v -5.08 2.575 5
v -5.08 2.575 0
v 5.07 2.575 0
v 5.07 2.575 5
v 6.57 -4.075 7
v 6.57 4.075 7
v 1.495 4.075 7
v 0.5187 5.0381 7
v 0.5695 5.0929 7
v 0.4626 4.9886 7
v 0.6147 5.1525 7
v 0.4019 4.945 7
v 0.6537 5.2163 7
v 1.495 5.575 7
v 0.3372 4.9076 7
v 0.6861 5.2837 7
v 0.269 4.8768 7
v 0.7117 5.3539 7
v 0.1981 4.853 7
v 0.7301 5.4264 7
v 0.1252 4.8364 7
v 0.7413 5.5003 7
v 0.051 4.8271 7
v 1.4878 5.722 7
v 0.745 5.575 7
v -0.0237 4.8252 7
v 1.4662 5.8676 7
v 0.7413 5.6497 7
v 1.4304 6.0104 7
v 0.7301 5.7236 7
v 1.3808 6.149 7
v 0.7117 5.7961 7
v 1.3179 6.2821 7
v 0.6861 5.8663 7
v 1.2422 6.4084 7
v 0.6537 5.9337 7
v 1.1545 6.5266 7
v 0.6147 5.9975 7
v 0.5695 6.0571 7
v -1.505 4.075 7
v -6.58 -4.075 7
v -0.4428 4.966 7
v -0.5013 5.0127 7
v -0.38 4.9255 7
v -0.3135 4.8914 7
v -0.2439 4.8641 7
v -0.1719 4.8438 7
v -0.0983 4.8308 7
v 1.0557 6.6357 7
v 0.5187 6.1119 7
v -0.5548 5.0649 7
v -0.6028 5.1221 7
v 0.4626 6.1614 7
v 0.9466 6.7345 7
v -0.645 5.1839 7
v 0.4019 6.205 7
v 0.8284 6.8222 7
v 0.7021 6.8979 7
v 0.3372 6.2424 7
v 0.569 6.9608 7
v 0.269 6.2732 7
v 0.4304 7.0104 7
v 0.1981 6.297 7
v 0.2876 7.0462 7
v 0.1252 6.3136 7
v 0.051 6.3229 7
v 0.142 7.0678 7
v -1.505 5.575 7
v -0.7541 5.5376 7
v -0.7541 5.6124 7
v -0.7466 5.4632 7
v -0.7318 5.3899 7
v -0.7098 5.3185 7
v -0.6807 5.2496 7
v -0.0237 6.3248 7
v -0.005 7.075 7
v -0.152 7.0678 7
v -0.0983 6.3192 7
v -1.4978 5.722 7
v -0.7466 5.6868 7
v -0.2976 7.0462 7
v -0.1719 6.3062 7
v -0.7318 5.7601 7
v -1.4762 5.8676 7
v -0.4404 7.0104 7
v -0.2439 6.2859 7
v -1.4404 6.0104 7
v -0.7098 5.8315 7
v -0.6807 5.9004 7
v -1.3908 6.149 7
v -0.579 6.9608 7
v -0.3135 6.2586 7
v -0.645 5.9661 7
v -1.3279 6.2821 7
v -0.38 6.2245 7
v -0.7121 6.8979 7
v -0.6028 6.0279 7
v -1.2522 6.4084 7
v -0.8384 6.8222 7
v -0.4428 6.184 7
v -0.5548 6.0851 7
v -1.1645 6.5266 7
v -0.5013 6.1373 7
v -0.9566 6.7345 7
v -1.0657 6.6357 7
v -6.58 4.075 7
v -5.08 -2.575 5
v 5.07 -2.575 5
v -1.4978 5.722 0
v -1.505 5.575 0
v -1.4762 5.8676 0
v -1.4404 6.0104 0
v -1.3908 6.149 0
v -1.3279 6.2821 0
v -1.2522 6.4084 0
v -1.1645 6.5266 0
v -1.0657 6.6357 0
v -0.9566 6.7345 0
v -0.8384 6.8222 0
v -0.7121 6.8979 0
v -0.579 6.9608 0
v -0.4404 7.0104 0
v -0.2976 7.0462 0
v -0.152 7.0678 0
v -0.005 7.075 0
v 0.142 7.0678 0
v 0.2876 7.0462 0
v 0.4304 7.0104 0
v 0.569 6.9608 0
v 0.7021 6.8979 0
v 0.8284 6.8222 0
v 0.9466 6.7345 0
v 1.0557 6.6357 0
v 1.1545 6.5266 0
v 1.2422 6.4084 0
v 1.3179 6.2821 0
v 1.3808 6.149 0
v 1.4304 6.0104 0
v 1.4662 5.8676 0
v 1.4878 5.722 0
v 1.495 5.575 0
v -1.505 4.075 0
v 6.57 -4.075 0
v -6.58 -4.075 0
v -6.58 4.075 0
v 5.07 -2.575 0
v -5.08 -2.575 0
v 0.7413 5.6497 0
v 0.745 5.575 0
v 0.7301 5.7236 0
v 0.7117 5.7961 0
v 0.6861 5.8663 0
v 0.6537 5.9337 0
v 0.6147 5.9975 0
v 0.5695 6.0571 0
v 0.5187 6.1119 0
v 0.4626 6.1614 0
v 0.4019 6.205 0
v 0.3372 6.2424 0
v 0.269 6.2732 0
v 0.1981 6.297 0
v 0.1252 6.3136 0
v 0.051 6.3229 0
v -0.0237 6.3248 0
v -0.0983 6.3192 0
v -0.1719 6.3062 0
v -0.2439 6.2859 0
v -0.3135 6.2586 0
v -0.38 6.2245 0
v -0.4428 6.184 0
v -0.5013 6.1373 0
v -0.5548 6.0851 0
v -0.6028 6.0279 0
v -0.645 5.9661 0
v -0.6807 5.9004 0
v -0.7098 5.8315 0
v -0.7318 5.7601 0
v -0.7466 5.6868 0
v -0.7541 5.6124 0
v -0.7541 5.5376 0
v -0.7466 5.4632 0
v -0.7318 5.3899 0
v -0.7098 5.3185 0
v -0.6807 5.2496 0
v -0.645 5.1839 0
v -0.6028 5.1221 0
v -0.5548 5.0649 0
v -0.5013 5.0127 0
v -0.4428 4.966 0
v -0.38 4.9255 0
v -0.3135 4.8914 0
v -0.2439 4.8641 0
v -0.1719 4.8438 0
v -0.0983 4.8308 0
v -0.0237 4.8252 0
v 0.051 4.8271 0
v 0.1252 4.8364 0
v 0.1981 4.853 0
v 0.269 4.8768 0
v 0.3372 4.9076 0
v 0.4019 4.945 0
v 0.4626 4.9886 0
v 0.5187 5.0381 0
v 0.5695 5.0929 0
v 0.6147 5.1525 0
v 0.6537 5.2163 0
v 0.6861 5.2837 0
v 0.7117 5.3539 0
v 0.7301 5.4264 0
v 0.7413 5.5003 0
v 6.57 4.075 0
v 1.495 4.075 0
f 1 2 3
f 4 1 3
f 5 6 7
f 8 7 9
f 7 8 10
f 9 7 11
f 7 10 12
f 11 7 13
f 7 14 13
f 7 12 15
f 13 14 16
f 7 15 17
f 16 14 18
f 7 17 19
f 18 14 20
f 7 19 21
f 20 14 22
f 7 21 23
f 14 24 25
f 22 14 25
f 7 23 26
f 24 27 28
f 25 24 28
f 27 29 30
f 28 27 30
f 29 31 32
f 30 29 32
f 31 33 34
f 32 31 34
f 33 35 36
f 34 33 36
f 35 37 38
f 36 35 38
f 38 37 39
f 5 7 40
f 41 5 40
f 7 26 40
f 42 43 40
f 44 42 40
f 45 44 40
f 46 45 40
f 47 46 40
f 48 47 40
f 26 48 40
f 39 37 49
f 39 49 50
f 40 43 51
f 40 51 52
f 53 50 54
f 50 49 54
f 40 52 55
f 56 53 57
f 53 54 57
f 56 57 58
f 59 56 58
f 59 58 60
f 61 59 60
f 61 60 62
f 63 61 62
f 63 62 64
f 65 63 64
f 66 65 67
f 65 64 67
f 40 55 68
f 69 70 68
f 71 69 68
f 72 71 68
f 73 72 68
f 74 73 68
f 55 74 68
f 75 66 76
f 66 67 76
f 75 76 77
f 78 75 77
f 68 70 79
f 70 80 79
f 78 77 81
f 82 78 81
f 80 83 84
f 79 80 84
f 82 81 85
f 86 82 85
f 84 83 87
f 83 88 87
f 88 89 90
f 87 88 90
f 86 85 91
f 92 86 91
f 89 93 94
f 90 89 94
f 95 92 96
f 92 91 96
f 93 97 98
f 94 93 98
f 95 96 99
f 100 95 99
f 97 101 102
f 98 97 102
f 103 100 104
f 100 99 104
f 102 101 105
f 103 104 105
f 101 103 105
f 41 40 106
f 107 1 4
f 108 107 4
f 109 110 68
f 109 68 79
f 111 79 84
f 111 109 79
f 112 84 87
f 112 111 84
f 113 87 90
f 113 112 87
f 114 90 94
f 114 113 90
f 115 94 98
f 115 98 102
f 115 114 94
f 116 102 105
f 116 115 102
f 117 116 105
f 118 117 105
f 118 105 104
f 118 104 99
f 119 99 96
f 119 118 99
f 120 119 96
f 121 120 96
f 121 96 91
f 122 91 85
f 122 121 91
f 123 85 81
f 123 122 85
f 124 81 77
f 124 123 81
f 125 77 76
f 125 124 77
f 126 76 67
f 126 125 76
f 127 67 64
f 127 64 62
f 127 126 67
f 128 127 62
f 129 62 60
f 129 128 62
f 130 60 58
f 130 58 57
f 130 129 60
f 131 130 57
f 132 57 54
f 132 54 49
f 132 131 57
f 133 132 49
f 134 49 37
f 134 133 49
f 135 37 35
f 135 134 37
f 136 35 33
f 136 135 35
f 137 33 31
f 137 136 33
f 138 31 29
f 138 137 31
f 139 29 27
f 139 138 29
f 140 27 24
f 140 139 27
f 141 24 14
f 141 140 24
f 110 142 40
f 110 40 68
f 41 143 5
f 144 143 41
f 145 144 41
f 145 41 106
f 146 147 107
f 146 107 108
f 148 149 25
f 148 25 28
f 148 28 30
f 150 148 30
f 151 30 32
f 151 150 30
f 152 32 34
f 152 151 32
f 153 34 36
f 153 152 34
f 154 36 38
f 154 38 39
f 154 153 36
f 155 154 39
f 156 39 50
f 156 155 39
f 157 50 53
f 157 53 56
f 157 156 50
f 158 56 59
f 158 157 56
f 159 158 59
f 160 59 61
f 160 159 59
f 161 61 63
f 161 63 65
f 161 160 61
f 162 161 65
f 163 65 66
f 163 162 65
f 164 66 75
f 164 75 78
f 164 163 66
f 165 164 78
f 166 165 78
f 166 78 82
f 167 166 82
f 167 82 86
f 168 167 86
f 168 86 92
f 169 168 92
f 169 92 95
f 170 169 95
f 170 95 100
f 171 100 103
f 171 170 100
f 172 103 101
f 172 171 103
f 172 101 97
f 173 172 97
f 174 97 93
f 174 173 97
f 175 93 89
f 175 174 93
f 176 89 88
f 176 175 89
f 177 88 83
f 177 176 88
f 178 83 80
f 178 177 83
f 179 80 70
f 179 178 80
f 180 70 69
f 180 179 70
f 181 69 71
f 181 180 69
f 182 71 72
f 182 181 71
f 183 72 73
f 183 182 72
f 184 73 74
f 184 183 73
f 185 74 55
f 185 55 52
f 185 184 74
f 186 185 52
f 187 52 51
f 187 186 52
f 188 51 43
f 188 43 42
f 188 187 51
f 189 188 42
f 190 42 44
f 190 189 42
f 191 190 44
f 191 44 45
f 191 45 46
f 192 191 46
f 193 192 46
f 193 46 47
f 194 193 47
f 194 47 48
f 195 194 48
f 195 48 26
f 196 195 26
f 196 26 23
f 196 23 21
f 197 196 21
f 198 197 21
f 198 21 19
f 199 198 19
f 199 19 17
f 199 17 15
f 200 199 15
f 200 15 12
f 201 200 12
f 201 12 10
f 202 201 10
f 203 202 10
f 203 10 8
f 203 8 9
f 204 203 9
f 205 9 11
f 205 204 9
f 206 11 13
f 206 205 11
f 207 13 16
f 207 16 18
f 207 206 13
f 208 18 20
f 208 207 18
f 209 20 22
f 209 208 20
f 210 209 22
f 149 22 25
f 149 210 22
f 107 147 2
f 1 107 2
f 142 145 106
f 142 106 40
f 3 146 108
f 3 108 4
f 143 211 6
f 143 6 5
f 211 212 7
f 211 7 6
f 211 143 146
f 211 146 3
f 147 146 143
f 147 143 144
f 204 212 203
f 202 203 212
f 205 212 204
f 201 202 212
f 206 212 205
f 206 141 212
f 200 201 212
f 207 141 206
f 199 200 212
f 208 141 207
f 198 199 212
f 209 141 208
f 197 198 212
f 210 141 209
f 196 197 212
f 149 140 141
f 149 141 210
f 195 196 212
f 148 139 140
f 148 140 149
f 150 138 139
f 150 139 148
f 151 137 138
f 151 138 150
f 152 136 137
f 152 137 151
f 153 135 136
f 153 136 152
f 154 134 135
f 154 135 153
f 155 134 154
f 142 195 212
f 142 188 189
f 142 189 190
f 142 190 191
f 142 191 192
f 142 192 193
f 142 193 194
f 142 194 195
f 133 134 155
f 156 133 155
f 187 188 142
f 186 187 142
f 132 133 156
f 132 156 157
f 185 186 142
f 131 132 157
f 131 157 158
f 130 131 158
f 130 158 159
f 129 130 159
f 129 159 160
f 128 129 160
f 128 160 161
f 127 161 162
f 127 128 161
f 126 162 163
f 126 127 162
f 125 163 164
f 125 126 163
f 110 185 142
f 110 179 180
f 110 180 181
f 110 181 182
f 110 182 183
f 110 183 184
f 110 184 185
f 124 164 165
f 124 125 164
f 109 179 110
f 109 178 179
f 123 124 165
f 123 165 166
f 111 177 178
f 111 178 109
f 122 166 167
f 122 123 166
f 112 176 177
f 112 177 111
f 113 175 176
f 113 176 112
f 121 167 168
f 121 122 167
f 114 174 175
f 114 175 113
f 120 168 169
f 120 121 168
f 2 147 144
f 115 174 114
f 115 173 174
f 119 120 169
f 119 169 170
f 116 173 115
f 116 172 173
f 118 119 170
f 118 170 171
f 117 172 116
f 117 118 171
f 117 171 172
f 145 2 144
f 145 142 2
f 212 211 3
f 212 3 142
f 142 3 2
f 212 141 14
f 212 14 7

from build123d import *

# Parameters (mm, degrees)
SKETCH1_R           = 0.75
SKETCH1_W           = 10.15
SKETCH1_H           = 5.15
BOSS_EXTRUDE1_DEPTH = 7
SKETCH2_W           = 13.15
SKETCH2_H           = 8.15
BOSS_EXTRUDE2_DEPTH = 2


with BuildPart() as part:
    # Sketch1 → Boss-Extrude1 (new body)
    with BuildSketch(Plane.XY):
        with BuildLine():
            Line((-6.58, 4.075), (-1.505, 4.075))
            Line((-1.505, 4.075), (-1.505, 5.575))
            ThreePointArc((-1.505, 5.575), (-0.005, 7.075), (1.495, 5.575))
            Line((1.495, 5.575), (1.495, 4.075))
            Line((1.495, 4.075), (6.57, 4.075))
            Line((6.57, 4.075), (6.57, -4.075))
            Line((6.57, -4.075), (-6.58, -4.075))
            Line((-6.58, -4.075), (-6.58, 4.075))
        make_face()
        with Locations((-0.005, 5.575)):
            Circle(SKETCH1_R, mode=Mode.SUBTRACT)
        with Locations((-0.005, 0)):
            Rectangle(SKETCH1_W, SKETCH1_H, mode=Mode.SUBTRACT)
    extrude(amount=BOSS_EXTRUDE1_DEPTH)

    # Sketch2 → Boss-Extrude2 (add)
    with BuildSketch(Plane.XY.offset(7)):
        with Locations((-0.005, 0)):
            Rectangle(SKETCH2_W, SKETCH2_H)
    extrude(amount=-BOSS_EXTRUDE2_DEPTH)


solid = part.part
